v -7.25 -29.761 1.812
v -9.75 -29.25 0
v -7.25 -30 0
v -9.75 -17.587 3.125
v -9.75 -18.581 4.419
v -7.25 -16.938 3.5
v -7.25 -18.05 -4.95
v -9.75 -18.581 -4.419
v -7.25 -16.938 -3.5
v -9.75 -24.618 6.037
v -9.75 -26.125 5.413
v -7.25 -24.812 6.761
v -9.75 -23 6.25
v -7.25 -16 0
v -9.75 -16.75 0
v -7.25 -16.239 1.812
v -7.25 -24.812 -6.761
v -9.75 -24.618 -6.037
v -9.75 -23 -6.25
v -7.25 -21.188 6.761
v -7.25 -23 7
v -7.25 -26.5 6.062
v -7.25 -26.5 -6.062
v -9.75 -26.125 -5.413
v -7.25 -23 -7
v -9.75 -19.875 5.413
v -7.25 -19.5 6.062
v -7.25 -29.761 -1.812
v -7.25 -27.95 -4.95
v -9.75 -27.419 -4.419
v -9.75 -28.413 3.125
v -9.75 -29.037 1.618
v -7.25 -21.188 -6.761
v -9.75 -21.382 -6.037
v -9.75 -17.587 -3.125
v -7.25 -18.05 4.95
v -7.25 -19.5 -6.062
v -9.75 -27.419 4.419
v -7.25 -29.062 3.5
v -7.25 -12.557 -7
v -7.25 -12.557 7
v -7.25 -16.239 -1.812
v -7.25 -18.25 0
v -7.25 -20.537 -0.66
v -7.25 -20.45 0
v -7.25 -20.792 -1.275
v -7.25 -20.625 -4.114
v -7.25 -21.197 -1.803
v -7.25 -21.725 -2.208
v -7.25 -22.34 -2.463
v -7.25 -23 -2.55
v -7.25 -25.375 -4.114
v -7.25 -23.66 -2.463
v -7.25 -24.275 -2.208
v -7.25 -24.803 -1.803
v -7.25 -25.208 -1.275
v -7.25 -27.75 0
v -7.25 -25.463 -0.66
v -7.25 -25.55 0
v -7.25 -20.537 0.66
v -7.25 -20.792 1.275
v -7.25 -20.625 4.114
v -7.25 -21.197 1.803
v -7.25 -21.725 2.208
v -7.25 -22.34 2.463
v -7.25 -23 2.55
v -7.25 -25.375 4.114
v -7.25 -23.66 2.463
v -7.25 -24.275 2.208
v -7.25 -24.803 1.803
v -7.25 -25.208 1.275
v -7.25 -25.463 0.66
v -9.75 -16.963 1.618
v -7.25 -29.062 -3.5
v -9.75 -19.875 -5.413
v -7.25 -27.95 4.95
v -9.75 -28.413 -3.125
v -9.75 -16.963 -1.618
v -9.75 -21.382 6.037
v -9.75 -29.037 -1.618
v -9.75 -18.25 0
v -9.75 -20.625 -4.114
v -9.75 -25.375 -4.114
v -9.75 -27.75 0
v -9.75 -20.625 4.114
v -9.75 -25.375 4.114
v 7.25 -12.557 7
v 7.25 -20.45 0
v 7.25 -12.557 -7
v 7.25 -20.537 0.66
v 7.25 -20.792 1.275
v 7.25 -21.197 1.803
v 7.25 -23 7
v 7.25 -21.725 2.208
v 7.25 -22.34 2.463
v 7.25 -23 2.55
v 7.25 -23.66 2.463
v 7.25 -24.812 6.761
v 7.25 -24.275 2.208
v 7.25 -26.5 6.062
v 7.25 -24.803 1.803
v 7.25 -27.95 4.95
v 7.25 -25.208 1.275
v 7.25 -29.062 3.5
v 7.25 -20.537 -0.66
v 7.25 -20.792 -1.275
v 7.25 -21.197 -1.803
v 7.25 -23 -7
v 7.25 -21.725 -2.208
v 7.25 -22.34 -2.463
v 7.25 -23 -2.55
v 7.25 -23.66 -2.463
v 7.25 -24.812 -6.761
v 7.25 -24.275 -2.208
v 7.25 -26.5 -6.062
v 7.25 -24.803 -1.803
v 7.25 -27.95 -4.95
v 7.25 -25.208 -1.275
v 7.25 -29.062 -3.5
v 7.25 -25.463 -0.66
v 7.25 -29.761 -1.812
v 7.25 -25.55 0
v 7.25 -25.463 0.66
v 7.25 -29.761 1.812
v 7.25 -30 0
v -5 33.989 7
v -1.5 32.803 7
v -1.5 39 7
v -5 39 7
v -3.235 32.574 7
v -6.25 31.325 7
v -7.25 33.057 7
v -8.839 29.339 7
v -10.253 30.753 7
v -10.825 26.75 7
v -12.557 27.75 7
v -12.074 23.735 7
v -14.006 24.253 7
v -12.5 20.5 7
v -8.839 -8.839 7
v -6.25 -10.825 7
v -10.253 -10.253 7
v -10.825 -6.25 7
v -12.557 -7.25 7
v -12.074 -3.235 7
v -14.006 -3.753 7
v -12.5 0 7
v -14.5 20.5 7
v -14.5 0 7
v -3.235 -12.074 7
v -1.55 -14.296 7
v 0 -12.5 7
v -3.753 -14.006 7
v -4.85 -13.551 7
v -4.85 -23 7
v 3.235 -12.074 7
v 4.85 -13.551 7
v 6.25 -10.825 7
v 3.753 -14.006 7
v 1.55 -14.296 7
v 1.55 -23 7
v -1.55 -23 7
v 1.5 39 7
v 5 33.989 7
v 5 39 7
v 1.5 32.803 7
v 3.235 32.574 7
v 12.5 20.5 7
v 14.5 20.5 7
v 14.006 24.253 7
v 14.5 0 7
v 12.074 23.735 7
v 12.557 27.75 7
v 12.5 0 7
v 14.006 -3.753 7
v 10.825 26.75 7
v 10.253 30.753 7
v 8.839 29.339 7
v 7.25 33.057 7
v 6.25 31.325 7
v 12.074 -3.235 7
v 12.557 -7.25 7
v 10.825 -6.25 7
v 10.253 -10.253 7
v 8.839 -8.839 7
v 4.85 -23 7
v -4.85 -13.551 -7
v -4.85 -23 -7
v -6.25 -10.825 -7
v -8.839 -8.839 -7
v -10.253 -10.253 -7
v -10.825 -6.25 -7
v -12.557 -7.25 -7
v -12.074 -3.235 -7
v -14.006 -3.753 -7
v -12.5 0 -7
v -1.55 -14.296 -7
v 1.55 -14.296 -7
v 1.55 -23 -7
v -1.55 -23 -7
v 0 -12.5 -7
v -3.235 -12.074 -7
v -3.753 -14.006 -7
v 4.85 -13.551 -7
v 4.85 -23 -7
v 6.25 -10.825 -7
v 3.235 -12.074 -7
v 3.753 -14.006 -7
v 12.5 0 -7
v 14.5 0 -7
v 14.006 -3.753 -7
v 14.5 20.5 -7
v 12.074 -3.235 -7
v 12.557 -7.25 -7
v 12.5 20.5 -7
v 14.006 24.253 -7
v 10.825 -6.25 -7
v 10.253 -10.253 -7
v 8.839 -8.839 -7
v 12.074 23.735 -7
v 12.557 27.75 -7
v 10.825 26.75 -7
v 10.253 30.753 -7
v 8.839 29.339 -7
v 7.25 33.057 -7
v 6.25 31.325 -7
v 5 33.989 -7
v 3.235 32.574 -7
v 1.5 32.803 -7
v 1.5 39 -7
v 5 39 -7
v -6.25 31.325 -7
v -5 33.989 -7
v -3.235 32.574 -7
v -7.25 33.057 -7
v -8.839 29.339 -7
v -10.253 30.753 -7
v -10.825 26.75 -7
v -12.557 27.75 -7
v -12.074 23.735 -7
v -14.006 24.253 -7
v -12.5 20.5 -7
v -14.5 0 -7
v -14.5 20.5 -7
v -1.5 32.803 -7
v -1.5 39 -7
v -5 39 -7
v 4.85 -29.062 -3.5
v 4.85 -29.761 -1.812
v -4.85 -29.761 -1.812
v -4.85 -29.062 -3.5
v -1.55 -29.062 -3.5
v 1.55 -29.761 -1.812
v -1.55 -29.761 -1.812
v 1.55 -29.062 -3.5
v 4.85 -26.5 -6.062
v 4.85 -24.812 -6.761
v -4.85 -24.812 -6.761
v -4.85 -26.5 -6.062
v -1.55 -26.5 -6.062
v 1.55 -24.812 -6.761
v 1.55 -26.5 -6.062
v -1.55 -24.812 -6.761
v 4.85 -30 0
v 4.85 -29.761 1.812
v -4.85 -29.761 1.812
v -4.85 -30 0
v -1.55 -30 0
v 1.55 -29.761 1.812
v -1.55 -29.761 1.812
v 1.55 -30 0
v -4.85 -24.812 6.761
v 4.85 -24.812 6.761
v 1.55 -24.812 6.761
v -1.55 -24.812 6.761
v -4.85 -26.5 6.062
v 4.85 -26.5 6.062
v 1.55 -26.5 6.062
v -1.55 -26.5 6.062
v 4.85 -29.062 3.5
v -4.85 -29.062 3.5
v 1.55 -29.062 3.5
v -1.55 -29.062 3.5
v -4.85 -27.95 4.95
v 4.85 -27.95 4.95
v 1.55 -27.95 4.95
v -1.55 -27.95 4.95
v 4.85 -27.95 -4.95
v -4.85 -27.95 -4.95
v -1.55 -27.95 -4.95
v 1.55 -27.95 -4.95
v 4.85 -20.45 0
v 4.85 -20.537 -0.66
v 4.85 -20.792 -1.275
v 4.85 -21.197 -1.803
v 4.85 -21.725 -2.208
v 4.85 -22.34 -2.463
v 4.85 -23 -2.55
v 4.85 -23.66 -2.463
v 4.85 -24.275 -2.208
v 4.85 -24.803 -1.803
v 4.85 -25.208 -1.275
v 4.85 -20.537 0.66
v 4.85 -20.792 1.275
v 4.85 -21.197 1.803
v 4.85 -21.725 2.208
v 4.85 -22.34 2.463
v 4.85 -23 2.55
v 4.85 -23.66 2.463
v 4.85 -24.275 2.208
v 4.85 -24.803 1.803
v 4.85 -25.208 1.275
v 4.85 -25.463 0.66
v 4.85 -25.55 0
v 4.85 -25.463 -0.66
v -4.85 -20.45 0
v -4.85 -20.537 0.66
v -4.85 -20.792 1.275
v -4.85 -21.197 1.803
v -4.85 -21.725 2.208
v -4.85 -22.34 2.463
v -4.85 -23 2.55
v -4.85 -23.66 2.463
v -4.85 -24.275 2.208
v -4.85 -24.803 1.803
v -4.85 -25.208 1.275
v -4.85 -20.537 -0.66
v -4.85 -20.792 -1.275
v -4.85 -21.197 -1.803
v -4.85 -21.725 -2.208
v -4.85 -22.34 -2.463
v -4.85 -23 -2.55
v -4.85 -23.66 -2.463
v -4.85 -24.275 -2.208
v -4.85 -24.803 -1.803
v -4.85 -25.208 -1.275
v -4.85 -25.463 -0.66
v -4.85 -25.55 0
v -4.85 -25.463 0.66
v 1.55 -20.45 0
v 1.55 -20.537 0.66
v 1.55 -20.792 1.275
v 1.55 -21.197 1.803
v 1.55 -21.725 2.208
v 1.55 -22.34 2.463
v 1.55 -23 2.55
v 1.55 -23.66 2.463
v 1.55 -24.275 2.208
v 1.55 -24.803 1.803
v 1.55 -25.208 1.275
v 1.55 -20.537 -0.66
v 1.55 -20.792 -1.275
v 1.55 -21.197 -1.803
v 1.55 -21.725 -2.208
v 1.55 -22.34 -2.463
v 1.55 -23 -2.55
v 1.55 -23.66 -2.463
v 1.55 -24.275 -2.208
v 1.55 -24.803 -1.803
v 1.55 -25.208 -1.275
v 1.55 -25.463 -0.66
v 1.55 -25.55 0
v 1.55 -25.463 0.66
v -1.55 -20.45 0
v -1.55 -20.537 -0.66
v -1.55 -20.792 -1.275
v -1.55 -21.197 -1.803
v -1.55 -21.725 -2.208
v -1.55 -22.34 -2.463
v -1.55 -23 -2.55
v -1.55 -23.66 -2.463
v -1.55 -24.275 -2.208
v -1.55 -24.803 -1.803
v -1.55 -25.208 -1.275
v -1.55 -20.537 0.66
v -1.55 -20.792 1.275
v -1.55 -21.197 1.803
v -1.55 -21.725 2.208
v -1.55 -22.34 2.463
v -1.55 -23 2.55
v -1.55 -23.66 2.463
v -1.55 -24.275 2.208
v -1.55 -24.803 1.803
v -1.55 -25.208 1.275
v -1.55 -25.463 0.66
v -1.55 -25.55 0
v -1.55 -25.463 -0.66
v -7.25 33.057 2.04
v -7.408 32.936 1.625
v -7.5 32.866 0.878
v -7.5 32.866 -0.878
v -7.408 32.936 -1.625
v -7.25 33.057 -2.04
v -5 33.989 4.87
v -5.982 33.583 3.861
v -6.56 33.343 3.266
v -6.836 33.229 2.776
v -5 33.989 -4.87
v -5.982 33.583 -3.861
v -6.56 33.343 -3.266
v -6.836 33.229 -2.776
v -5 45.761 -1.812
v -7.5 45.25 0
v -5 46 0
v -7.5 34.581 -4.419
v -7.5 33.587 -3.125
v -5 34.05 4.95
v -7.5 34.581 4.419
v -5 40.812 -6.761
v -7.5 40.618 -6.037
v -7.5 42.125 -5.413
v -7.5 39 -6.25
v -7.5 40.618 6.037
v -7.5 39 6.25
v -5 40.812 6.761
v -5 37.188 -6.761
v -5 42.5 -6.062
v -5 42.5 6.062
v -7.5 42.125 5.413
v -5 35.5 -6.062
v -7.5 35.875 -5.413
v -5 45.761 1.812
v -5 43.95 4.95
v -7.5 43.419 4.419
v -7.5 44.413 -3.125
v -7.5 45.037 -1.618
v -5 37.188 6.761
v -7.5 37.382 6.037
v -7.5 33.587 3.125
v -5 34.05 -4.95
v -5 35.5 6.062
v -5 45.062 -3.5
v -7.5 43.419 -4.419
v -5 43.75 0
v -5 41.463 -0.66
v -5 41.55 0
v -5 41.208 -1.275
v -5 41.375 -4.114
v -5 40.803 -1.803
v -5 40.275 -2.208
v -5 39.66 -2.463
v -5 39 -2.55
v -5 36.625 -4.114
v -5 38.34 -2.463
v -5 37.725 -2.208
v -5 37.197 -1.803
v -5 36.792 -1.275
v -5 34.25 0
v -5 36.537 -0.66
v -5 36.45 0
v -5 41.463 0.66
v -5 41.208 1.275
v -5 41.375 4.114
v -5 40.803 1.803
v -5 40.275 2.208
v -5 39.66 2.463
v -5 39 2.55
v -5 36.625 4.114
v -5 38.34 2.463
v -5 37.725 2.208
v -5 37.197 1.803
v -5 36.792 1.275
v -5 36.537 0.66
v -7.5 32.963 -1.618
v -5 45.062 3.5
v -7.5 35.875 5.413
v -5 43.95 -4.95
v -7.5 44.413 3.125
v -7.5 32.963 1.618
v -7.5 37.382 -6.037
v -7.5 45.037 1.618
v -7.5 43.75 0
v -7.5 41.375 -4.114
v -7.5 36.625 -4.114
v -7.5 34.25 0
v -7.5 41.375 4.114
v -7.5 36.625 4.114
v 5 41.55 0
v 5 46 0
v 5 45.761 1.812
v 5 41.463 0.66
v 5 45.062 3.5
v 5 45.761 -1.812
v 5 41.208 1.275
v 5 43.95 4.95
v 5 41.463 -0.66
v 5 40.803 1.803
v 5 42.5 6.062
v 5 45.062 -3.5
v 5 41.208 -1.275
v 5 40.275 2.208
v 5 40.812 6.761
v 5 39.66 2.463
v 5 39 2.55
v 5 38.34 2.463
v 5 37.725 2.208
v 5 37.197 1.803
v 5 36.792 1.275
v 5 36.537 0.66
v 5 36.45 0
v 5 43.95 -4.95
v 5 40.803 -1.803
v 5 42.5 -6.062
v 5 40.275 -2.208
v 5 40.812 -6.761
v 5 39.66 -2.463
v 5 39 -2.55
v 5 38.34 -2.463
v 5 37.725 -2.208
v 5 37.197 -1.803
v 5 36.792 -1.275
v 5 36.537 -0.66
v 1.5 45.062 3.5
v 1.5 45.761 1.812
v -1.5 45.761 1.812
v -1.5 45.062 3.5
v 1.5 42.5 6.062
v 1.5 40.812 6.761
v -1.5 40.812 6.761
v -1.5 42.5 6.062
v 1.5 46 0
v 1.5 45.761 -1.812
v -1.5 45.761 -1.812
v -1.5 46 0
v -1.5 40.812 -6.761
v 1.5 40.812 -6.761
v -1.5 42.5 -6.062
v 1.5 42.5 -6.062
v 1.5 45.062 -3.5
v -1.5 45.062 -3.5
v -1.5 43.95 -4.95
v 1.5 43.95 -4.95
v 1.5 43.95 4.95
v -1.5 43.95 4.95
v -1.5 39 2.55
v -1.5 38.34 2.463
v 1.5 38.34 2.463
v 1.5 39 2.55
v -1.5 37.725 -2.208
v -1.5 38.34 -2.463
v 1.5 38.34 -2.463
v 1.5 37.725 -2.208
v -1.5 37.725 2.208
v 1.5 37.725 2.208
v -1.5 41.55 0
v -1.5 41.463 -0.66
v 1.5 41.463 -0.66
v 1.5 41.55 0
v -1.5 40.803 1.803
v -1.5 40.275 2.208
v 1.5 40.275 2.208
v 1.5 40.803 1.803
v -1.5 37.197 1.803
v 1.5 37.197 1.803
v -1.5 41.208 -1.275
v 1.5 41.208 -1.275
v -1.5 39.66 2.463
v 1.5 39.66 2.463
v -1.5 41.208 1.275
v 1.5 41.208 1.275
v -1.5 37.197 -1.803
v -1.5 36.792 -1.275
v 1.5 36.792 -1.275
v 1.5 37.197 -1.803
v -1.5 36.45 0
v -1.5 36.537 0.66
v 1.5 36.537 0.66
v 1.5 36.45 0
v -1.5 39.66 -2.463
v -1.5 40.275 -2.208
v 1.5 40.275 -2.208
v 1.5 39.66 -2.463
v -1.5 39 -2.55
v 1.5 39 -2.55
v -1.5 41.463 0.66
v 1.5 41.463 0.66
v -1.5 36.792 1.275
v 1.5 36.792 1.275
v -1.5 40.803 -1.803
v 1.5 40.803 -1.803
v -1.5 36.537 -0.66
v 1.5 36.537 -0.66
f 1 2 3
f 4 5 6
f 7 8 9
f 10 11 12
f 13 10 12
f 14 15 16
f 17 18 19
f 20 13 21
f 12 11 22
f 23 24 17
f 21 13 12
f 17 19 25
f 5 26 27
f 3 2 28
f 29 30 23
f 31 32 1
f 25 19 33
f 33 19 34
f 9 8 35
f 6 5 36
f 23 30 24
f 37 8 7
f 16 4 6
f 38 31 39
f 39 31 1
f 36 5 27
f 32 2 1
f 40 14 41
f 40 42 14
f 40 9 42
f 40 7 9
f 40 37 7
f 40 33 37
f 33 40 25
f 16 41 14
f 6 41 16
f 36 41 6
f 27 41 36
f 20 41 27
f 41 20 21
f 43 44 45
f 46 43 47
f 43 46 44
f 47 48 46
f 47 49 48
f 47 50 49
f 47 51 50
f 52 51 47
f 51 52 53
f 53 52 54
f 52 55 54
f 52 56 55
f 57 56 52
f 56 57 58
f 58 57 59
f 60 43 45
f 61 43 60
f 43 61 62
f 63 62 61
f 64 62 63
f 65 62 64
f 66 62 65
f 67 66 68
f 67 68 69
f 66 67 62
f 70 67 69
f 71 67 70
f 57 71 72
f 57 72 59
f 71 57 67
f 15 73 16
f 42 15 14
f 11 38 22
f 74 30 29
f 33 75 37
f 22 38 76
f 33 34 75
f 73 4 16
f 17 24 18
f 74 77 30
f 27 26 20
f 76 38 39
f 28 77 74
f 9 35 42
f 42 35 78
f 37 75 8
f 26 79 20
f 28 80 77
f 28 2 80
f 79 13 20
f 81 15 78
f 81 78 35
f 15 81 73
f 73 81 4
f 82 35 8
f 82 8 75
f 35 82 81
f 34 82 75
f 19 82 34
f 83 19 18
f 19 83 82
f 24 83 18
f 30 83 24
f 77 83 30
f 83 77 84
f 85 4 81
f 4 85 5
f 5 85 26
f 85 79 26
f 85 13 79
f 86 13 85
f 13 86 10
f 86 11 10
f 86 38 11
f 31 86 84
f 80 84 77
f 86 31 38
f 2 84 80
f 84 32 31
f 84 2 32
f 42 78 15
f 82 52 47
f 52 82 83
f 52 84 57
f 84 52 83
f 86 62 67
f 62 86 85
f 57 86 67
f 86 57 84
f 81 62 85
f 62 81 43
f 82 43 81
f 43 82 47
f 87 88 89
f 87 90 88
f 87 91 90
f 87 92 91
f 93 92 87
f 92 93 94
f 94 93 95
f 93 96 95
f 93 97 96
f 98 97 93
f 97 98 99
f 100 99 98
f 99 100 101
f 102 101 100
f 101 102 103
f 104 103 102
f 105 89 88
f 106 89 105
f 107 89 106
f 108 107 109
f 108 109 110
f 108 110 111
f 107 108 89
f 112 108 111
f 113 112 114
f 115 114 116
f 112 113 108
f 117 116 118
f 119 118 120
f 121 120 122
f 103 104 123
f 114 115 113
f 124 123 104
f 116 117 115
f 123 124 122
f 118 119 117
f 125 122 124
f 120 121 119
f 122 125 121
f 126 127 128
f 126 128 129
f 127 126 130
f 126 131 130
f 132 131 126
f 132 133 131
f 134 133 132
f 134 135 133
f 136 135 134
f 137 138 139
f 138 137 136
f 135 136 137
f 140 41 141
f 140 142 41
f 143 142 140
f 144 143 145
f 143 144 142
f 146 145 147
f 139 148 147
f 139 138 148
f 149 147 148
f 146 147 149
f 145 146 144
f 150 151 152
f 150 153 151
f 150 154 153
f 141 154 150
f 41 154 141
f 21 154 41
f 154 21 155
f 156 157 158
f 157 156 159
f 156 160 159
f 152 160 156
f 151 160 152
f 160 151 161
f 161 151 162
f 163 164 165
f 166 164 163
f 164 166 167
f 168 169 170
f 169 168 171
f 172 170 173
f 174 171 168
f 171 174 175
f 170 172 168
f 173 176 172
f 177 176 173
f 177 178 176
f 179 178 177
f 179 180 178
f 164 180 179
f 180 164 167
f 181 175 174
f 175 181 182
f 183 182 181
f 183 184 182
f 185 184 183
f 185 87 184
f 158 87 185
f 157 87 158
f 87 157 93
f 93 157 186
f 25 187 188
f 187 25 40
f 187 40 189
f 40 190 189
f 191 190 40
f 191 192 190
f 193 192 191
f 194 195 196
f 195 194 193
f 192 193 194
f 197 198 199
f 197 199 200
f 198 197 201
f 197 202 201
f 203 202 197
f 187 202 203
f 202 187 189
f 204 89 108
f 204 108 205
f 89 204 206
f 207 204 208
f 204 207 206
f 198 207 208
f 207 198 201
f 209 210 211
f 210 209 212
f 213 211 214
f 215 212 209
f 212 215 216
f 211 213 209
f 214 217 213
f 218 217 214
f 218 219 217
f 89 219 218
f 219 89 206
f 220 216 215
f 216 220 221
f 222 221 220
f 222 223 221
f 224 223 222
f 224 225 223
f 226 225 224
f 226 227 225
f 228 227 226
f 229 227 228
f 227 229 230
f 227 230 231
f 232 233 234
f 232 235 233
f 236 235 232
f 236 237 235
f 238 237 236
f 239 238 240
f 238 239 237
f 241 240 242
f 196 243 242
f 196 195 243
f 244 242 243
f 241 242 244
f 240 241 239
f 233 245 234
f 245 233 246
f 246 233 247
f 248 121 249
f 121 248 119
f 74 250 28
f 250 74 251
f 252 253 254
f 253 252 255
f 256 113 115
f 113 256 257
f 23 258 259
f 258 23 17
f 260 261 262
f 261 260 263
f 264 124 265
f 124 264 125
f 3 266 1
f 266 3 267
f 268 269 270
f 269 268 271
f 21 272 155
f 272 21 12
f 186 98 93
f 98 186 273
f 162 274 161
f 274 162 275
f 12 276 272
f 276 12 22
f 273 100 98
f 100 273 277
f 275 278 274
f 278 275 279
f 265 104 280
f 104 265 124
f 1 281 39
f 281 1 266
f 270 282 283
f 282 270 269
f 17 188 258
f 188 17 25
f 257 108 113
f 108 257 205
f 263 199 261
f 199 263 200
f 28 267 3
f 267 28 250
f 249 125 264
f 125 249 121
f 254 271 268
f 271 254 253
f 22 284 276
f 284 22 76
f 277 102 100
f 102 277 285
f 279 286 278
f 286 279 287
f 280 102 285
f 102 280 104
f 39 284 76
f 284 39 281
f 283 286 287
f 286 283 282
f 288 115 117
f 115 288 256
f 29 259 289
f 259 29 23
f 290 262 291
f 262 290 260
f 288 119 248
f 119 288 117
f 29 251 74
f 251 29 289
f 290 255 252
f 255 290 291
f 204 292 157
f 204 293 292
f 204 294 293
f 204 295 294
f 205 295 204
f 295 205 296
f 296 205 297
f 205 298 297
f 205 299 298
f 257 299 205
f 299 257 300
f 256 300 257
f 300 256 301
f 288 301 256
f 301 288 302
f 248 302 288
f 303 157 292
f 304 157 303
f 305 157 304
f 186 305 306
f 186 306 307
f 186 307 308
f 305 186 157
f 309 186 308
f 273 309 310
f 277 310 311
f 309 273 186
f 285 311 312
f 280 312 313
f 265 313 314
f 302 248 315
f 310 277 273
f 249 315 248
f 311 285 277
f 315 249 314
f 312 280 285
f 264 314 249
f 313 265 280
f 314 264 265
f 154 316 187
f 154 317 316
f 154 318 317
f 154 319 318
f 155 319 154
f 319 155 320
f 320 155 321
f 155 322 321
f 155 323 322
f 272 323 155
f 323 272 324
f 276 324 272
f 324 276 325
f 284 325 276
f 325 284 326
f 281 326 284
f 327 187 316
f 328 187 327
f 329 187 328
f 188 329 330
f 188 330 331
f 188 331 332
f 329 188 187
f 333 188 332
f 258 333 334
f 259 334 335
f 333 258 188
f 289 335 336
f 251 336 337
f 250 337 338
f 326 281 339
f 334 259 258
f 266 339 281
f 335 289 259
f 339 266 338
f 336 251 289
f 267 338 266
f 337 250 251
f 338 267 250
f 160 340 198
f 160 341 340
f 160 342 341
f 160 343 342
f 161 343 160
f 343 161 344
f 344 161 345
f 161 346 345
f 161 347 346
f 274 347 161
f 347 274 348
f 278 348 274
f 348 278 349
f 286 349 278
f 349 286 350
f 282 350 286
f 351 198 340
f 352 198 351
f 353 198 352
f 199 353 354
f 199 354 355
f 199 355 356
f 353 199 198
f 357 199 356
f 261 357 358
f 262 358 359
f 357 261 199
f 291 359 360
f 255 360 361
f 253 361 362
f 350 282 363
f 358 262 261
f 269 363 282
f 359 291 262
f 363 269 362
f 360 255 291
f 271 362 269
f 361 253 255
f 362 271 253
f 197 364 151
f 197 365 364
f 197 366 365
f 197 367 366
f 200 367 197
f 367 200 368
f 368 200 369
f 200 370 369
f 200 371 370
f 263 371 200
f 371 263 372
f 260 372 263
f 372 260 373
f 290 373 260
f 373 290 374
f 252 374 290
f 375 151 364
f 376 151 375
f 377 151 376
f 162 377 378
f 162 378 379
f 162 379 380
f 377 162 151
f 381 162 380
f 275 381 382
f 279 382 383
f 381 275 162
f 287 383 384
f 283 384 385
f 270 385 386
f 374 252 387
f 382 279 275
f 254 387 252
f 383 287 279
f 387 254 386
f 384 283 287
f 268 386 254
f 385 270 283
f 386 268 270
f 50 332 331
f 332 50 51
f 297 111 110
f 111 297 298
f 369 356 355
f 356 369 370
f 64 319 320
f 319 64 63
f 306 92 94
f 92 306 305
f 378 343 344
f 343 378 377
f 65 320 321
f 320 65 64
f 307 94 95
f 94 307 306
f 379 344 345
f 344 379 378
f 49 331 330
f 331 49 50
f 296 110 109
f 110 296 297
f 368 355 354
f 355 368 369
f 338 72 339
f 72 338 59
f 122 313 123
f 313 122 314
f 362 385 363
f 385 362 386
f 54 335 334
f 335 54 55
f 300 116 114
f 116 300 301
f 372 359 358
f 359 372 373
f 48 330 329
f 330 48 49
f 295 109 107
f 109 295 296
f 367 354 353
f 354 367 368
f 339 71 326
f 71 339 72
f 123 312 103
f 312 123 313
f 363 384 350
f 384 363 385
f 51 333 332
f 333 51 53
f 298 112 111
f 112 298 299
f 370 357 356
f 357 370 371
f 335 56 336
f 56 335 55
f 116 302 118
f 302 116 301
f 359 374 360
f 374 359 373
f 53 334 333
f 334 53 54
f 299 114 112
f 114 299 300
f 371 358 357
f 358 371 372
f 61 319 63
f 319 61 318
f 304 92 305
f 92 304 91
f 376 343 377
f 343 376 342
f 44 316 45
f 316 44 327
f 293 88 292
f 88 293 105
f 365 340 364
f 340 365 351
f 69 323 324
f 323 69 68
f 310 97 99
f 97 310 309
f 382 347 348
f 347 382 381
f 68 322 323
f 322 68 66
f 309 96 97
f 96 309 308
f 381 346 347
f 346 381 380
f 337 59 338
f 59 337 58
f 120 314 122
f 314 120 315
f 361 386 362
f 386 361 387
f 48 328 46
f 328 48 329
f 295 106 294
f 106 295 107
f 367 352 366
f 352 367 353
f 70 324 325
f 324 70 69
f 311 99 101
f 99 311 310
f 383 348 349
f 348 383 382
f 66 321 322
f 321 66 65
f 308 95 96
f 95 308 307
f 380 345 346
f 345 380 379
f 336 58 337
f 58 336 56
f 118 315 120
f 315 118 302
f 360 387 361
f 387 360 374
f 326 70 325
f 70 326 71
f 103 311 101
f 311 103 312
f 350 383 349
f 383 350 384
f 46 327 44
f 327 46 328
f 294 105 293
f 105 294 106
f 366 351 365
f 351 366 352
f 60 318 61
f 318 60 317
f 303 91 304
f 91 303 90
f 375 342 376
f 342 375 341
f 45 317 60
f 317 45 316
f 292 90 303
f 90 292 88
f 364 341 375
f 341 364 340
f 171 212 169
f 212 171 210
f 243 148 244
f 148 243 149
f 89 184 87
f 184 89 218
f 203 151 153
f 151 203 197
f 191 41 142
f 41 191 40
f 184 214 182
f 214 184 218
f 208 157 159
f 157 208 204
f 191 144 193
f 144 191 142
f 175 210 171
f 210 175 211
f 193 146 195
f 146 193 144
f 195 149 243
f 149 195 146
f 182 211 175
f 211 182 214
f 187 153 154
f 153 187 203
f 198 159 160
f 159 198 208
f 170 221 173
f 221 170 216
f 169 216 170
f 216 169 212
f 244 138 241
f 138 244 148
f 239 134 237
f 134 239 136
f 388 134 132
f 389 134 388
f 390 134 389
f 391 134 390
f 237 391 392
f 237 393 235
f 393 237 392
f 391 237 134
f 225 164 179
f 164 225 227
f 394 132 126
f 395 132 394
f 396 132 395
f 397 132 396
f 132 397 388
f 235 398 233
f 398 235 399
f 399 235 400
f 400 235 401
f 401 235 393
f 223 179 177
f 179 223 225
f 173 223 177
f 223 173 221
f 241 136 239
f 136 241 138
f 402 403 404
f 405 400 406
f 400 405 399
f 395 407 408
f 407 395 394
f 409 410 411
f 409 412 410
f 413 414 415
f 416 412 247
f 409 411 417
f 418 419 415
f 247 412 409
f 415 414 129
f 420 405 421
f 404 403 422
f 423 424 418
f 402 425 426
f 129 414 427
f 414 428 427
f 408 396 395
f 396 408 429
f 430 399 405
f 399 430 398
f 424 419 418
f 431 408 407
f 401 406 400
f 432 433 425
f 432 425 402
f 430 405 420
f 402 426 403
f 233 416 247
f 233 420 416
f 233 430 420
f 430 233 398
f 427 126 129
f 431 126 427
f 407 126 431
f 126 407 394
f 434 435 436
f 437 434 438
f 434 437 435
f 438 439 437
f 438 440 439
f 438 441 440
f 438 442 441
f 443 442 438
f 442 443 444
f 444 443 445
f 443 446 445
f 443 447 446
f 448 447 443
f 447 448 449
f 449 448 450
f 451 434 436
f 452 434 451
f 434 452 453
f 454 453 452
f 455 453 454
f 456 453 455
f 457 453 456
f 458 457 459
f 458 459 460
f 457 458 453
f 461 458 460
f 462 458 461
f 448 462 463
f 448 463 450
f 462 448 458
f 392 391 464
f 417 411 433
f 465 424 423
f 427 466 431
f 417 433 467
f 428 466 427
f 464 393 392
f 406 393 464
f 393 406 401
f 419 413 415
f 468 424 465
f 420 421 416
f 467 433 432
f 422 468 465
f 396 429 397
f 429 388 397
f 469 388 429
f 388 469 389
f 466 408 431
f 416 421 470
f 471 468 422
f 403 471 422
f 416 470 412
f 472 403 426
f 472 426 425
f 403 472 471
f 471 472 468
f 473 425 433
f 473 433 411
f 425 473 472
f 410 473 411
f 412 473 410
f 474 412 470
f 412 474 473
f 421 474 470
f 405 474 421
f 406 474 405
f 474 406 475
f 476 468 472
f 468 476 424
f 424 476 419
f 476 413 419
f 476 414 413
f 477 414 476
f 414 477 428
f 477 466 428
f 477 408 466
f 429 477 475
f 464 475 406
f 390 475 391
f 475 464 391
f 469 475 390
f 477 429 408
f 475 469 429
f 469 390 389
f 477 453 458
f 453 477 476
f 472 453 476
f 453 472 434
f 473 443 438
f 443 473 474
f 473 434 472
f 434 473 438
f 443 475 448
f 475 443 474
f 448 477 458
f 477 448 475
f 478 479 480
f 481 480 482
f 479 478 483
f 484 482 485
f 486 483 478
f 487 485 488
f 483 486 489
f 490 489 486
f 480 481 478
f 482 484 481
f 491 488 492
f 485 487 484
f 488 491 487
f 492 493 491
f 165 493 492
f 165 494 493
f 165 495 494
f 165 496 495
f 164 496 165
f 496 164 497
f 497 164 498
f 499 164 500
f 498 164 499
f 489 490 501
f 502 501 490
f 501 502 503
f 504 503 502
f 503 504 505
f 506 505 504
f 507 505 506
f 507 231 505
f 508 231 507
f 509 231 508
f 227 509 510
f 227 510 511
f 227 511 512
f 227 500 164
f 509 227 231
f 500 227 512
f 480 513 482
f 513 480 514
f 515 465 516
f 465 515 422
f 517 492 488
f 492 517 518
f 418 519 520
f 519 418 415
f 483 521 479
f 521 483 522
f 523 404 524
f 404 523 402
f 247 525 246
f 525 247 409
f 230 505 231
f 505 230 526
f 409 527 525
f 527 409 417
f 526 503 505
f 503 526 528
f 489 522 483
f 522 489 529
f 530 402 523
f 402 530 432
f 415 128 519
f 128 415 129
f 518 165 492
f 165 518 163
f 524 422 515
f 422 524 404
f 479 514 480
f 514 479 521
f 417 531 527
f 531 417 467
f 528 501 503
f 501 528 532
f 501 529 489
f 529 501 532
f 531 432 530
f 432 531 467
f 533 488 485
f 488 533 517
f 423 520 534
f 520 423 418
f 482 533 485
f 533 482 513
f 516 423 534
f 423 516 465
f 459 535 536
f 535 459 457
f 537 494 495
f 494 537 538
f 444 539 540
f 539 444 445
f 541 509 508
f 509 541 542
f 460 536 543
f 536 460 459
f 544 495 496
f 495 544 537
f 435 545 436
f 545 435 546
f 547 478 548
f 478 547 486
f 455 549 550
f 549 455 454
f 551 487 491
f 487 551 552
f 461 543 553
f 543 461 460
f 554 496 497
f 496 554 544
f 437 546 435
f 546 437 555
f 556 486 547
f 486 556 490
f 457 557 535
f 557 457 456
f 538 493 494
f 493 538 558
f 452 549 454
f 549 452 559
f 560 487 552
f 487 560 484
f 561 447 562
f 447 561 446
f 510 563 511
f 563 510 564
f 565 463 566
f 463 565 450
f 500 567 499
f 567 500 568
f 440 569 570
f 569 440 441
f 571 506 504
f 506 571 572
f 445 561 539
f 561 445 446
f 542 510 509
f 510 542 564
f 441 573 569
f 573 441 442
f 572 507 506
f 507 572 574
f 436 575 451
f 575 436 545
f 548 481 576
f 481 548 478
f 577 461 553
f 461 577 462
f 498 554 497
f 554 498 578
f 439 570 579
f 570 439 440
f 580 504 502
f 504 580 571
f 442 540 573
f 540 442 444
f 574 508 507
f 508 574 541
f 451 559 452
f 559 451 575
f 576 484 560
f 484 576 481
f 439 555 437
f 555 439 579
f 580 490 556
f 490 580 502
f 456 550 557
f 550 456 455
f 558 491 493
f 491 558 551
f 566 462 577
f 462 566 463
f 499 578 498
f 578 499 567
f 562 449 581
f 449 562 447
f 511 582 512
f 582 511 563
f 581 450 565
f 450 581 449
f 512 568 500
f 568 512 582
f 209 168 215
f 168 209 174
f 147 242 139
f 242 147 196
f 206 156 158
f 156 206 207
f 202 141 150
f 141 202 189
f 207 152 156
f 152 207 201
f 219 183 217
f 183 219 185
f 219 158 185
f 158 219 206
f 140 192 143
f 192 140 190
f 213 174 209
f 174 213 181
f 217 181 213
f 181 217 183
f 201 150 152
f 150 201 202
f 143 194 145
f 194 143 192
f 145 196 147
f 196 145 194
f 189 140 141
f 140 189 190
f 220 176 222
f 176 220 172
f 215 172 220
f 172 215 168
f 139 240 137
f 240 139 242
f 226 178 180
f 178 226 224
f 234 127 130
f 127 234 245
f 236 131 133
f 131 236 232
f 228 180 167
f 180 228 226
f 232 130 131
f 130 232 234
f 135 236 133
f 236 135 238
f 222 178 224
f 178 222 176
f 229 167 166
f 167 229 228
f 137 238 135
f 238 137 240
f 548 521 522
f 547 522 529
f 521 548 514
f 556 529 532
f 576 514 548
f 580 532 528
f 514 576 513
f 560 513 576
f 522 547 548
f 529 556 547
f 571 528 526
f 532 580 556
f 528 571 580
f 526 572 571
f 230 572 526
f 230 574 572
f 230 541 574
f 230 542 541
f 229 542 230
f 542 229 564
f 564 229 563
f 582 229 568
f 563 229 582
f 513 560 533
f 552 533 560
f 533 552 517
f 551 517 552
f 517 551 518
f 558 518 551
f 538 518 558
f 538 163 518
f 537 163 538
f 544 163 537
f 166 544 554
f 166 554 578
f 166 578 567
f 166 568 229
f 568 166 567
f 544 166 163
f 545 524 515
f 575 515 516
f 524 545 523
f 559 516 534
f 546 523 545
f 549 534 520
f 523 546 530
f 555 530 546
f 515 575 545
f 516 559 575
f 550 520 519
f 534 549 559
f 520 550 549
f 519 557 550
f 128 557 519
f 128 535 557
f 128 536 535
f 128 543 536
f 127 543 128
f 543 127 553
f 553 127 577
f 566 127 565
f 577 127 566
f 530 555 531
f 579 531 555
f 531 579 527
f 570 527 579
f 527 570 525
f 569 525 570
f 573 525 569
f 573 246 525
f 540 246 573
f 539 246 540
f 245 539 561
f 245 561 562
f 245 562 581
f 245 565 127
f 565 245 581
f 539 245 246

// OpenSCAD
// Shawn Rutledge 2018 https://www.thingiverse.com/ecloud
// GoPro-compatible 3-tab mount taken from https://www.thingiverse.com/thing:909819 by Nicholas Brookins

// width of the powerpack (plus cushioning, plus clearance depending on your printer)
powerpack_width = 45.5;
// height of the powerpack (plus cushioning, plus clearance depending on your printer)
powerpack_thickness = 25;
// how thick should the walls be around the powerpack
wall_thickness = 2;

//height of the mount from one edge of the holder to the center of the gopro bolt hole
gopro_mount_height = 8.5;

//the width of this clamp
clamp_width = 14;
//Style of hole for bolt clearance on top half
clamp_top_hole_style = 2; //[0:None, 1:Round, 2:HexNut]
//Style of hole for bolt clearance on bottom half
clamp_bottom_hole_style = 1;//[0:None, 1:Round, 2:HexNut]

// width of the powerbank bolt clip
powerbank_clamp_width = 10;

//width of the gopro mount
gopro_mount_width = 14.5;
//width of the tab that hangs off the gopro
gopro_mount_tab_width = 9.7;
//with of the middle slot in the gopro tab
gopro_mount_tab_slot_width = 3.1;
//width of the gopro bolt nut
gopro_mount_nut_width= 9.5;
//diameter of the gopro bolt
gopro_mount_bolt_diameter = 5.1;

//auto vars
gopro_nut_flare = 1.5;
gopro_nut_flarewidth = 2.5;
gopro_mount_height_adj = gopro_mount_height + powerpack_thickness / 2 + wall_thickness;
$fn=24;

module nut_holder(mount_width, stickout) {
	translate([-mount_width/2,0, stickout])
	rotate([0,-90,0])
	difference(){
		cylinder(r1=clamp_width/2, r2=gopro_mount_nut_width/2 + gopro_nut_flare, h=gopro_nut_flarewidth);
		translate([0,0,-.01])
		cylinder(d=gopro_mount_nut_width, h=gopro_nut_flarewidth+.02, $fn=6);
	}
}

module gopro_tabs(){
	difference(){
		union(){
			//mount body
			translate([0,0, gopro_mount_height_adj/2])
			cube([gopro_mount_width, clamp_width, gopro_mount_height_adj], center=true);
			//rounded top
			translate([0,0, gopro_mount_height_adj])
			rotate([0,-90,0])
			cylinder(d=clamp_width, h=gopro_mount_width, center=true);

			//nut flare and hole
			nut_holder(gopro_mount_width, gopro_mount_height_adj);
		}
		//GoPro Bolt Hole
		translate([0,0, gopro_mount_height_adj])
		rotate([0,-90,0])
		cylinder(d=gopro_mount_bolt_diameter, h=gopro_mount_width*2, center=true);

		//gopro tab and slot
		translate([0,0,gopro_mount_height_adj ])
		difference(){
			cube([gopro_mount_tab_width, clamp_width+.1, gopro_mount_height_adj*2], center=true);
			cube([gopro_mount_tab_slot_width, clamp_width+.15, gopro_mount_height_adj*2], center=true);
		}
	}
}

module clamp_tabs(){
	clamp_stickout = 4 + powerpack_thickness / 2 + wall_thickness;
	difference() {
		union() {
			//mount body
			translate([0,0, clamp_stickout/2])
			cube([powerbank_clamp_width, clamp_width, clamp_stickout], center=true);
			//rounded top
			translate([0,0, clamp_stickout])
			rotate([0,-90,0])
			cylinder(d=clamp_width, h=powerbank_clamp_width, center=true);

			//nut flare and hole
			nut_holder(powerbank_clamp_width, clamp_stickout);
		}
		//GoPro Bolt Hole
		translate([0,0, clamp_stickout])
		rotate([0,-90,0])
		cylinder(d=gopro_mount_bolt_diameter, h=gopro_mount_width*2, center=true);
	}
}

module lozenge(l, w, h) {
	union() {
		translate([w / -2, 0, h / -2])
			cube([w, l - w, h]);
		translate([0, 0, h / -2])
			cylinder(d=w,h=h);
		translate([0, l - w, h / -2])
			cylinder(d=w,h=h);
	}
}

difference() {
	union() {
		rotate([90, 0, 0]) translate([0, 0, 0]) gopro_tabs();
			lozenge(powerpack_width + wall_thickness * 2, powerpack_thickness + wall_thickness * 2, clamp_width);
		translate([0, powerpack_width - powerpack_thickness, 0]) rotate([-90, 0, 0]) clamp_tabs();
			lozenge(powerpack_width + wall_thickness * 2, powerpack_thickness + wall_thickness * 2, clamp_width);
	};
	lozenge(powerpack_width, powerpack_thickness, clamp_width + 1);
	translate([0, powerpack_width - 2, 0]) cube([3, gopro_mount_height_adj + wall_thickness, gopro_mount_height_adj + wall_thickness] , center=true);
}
